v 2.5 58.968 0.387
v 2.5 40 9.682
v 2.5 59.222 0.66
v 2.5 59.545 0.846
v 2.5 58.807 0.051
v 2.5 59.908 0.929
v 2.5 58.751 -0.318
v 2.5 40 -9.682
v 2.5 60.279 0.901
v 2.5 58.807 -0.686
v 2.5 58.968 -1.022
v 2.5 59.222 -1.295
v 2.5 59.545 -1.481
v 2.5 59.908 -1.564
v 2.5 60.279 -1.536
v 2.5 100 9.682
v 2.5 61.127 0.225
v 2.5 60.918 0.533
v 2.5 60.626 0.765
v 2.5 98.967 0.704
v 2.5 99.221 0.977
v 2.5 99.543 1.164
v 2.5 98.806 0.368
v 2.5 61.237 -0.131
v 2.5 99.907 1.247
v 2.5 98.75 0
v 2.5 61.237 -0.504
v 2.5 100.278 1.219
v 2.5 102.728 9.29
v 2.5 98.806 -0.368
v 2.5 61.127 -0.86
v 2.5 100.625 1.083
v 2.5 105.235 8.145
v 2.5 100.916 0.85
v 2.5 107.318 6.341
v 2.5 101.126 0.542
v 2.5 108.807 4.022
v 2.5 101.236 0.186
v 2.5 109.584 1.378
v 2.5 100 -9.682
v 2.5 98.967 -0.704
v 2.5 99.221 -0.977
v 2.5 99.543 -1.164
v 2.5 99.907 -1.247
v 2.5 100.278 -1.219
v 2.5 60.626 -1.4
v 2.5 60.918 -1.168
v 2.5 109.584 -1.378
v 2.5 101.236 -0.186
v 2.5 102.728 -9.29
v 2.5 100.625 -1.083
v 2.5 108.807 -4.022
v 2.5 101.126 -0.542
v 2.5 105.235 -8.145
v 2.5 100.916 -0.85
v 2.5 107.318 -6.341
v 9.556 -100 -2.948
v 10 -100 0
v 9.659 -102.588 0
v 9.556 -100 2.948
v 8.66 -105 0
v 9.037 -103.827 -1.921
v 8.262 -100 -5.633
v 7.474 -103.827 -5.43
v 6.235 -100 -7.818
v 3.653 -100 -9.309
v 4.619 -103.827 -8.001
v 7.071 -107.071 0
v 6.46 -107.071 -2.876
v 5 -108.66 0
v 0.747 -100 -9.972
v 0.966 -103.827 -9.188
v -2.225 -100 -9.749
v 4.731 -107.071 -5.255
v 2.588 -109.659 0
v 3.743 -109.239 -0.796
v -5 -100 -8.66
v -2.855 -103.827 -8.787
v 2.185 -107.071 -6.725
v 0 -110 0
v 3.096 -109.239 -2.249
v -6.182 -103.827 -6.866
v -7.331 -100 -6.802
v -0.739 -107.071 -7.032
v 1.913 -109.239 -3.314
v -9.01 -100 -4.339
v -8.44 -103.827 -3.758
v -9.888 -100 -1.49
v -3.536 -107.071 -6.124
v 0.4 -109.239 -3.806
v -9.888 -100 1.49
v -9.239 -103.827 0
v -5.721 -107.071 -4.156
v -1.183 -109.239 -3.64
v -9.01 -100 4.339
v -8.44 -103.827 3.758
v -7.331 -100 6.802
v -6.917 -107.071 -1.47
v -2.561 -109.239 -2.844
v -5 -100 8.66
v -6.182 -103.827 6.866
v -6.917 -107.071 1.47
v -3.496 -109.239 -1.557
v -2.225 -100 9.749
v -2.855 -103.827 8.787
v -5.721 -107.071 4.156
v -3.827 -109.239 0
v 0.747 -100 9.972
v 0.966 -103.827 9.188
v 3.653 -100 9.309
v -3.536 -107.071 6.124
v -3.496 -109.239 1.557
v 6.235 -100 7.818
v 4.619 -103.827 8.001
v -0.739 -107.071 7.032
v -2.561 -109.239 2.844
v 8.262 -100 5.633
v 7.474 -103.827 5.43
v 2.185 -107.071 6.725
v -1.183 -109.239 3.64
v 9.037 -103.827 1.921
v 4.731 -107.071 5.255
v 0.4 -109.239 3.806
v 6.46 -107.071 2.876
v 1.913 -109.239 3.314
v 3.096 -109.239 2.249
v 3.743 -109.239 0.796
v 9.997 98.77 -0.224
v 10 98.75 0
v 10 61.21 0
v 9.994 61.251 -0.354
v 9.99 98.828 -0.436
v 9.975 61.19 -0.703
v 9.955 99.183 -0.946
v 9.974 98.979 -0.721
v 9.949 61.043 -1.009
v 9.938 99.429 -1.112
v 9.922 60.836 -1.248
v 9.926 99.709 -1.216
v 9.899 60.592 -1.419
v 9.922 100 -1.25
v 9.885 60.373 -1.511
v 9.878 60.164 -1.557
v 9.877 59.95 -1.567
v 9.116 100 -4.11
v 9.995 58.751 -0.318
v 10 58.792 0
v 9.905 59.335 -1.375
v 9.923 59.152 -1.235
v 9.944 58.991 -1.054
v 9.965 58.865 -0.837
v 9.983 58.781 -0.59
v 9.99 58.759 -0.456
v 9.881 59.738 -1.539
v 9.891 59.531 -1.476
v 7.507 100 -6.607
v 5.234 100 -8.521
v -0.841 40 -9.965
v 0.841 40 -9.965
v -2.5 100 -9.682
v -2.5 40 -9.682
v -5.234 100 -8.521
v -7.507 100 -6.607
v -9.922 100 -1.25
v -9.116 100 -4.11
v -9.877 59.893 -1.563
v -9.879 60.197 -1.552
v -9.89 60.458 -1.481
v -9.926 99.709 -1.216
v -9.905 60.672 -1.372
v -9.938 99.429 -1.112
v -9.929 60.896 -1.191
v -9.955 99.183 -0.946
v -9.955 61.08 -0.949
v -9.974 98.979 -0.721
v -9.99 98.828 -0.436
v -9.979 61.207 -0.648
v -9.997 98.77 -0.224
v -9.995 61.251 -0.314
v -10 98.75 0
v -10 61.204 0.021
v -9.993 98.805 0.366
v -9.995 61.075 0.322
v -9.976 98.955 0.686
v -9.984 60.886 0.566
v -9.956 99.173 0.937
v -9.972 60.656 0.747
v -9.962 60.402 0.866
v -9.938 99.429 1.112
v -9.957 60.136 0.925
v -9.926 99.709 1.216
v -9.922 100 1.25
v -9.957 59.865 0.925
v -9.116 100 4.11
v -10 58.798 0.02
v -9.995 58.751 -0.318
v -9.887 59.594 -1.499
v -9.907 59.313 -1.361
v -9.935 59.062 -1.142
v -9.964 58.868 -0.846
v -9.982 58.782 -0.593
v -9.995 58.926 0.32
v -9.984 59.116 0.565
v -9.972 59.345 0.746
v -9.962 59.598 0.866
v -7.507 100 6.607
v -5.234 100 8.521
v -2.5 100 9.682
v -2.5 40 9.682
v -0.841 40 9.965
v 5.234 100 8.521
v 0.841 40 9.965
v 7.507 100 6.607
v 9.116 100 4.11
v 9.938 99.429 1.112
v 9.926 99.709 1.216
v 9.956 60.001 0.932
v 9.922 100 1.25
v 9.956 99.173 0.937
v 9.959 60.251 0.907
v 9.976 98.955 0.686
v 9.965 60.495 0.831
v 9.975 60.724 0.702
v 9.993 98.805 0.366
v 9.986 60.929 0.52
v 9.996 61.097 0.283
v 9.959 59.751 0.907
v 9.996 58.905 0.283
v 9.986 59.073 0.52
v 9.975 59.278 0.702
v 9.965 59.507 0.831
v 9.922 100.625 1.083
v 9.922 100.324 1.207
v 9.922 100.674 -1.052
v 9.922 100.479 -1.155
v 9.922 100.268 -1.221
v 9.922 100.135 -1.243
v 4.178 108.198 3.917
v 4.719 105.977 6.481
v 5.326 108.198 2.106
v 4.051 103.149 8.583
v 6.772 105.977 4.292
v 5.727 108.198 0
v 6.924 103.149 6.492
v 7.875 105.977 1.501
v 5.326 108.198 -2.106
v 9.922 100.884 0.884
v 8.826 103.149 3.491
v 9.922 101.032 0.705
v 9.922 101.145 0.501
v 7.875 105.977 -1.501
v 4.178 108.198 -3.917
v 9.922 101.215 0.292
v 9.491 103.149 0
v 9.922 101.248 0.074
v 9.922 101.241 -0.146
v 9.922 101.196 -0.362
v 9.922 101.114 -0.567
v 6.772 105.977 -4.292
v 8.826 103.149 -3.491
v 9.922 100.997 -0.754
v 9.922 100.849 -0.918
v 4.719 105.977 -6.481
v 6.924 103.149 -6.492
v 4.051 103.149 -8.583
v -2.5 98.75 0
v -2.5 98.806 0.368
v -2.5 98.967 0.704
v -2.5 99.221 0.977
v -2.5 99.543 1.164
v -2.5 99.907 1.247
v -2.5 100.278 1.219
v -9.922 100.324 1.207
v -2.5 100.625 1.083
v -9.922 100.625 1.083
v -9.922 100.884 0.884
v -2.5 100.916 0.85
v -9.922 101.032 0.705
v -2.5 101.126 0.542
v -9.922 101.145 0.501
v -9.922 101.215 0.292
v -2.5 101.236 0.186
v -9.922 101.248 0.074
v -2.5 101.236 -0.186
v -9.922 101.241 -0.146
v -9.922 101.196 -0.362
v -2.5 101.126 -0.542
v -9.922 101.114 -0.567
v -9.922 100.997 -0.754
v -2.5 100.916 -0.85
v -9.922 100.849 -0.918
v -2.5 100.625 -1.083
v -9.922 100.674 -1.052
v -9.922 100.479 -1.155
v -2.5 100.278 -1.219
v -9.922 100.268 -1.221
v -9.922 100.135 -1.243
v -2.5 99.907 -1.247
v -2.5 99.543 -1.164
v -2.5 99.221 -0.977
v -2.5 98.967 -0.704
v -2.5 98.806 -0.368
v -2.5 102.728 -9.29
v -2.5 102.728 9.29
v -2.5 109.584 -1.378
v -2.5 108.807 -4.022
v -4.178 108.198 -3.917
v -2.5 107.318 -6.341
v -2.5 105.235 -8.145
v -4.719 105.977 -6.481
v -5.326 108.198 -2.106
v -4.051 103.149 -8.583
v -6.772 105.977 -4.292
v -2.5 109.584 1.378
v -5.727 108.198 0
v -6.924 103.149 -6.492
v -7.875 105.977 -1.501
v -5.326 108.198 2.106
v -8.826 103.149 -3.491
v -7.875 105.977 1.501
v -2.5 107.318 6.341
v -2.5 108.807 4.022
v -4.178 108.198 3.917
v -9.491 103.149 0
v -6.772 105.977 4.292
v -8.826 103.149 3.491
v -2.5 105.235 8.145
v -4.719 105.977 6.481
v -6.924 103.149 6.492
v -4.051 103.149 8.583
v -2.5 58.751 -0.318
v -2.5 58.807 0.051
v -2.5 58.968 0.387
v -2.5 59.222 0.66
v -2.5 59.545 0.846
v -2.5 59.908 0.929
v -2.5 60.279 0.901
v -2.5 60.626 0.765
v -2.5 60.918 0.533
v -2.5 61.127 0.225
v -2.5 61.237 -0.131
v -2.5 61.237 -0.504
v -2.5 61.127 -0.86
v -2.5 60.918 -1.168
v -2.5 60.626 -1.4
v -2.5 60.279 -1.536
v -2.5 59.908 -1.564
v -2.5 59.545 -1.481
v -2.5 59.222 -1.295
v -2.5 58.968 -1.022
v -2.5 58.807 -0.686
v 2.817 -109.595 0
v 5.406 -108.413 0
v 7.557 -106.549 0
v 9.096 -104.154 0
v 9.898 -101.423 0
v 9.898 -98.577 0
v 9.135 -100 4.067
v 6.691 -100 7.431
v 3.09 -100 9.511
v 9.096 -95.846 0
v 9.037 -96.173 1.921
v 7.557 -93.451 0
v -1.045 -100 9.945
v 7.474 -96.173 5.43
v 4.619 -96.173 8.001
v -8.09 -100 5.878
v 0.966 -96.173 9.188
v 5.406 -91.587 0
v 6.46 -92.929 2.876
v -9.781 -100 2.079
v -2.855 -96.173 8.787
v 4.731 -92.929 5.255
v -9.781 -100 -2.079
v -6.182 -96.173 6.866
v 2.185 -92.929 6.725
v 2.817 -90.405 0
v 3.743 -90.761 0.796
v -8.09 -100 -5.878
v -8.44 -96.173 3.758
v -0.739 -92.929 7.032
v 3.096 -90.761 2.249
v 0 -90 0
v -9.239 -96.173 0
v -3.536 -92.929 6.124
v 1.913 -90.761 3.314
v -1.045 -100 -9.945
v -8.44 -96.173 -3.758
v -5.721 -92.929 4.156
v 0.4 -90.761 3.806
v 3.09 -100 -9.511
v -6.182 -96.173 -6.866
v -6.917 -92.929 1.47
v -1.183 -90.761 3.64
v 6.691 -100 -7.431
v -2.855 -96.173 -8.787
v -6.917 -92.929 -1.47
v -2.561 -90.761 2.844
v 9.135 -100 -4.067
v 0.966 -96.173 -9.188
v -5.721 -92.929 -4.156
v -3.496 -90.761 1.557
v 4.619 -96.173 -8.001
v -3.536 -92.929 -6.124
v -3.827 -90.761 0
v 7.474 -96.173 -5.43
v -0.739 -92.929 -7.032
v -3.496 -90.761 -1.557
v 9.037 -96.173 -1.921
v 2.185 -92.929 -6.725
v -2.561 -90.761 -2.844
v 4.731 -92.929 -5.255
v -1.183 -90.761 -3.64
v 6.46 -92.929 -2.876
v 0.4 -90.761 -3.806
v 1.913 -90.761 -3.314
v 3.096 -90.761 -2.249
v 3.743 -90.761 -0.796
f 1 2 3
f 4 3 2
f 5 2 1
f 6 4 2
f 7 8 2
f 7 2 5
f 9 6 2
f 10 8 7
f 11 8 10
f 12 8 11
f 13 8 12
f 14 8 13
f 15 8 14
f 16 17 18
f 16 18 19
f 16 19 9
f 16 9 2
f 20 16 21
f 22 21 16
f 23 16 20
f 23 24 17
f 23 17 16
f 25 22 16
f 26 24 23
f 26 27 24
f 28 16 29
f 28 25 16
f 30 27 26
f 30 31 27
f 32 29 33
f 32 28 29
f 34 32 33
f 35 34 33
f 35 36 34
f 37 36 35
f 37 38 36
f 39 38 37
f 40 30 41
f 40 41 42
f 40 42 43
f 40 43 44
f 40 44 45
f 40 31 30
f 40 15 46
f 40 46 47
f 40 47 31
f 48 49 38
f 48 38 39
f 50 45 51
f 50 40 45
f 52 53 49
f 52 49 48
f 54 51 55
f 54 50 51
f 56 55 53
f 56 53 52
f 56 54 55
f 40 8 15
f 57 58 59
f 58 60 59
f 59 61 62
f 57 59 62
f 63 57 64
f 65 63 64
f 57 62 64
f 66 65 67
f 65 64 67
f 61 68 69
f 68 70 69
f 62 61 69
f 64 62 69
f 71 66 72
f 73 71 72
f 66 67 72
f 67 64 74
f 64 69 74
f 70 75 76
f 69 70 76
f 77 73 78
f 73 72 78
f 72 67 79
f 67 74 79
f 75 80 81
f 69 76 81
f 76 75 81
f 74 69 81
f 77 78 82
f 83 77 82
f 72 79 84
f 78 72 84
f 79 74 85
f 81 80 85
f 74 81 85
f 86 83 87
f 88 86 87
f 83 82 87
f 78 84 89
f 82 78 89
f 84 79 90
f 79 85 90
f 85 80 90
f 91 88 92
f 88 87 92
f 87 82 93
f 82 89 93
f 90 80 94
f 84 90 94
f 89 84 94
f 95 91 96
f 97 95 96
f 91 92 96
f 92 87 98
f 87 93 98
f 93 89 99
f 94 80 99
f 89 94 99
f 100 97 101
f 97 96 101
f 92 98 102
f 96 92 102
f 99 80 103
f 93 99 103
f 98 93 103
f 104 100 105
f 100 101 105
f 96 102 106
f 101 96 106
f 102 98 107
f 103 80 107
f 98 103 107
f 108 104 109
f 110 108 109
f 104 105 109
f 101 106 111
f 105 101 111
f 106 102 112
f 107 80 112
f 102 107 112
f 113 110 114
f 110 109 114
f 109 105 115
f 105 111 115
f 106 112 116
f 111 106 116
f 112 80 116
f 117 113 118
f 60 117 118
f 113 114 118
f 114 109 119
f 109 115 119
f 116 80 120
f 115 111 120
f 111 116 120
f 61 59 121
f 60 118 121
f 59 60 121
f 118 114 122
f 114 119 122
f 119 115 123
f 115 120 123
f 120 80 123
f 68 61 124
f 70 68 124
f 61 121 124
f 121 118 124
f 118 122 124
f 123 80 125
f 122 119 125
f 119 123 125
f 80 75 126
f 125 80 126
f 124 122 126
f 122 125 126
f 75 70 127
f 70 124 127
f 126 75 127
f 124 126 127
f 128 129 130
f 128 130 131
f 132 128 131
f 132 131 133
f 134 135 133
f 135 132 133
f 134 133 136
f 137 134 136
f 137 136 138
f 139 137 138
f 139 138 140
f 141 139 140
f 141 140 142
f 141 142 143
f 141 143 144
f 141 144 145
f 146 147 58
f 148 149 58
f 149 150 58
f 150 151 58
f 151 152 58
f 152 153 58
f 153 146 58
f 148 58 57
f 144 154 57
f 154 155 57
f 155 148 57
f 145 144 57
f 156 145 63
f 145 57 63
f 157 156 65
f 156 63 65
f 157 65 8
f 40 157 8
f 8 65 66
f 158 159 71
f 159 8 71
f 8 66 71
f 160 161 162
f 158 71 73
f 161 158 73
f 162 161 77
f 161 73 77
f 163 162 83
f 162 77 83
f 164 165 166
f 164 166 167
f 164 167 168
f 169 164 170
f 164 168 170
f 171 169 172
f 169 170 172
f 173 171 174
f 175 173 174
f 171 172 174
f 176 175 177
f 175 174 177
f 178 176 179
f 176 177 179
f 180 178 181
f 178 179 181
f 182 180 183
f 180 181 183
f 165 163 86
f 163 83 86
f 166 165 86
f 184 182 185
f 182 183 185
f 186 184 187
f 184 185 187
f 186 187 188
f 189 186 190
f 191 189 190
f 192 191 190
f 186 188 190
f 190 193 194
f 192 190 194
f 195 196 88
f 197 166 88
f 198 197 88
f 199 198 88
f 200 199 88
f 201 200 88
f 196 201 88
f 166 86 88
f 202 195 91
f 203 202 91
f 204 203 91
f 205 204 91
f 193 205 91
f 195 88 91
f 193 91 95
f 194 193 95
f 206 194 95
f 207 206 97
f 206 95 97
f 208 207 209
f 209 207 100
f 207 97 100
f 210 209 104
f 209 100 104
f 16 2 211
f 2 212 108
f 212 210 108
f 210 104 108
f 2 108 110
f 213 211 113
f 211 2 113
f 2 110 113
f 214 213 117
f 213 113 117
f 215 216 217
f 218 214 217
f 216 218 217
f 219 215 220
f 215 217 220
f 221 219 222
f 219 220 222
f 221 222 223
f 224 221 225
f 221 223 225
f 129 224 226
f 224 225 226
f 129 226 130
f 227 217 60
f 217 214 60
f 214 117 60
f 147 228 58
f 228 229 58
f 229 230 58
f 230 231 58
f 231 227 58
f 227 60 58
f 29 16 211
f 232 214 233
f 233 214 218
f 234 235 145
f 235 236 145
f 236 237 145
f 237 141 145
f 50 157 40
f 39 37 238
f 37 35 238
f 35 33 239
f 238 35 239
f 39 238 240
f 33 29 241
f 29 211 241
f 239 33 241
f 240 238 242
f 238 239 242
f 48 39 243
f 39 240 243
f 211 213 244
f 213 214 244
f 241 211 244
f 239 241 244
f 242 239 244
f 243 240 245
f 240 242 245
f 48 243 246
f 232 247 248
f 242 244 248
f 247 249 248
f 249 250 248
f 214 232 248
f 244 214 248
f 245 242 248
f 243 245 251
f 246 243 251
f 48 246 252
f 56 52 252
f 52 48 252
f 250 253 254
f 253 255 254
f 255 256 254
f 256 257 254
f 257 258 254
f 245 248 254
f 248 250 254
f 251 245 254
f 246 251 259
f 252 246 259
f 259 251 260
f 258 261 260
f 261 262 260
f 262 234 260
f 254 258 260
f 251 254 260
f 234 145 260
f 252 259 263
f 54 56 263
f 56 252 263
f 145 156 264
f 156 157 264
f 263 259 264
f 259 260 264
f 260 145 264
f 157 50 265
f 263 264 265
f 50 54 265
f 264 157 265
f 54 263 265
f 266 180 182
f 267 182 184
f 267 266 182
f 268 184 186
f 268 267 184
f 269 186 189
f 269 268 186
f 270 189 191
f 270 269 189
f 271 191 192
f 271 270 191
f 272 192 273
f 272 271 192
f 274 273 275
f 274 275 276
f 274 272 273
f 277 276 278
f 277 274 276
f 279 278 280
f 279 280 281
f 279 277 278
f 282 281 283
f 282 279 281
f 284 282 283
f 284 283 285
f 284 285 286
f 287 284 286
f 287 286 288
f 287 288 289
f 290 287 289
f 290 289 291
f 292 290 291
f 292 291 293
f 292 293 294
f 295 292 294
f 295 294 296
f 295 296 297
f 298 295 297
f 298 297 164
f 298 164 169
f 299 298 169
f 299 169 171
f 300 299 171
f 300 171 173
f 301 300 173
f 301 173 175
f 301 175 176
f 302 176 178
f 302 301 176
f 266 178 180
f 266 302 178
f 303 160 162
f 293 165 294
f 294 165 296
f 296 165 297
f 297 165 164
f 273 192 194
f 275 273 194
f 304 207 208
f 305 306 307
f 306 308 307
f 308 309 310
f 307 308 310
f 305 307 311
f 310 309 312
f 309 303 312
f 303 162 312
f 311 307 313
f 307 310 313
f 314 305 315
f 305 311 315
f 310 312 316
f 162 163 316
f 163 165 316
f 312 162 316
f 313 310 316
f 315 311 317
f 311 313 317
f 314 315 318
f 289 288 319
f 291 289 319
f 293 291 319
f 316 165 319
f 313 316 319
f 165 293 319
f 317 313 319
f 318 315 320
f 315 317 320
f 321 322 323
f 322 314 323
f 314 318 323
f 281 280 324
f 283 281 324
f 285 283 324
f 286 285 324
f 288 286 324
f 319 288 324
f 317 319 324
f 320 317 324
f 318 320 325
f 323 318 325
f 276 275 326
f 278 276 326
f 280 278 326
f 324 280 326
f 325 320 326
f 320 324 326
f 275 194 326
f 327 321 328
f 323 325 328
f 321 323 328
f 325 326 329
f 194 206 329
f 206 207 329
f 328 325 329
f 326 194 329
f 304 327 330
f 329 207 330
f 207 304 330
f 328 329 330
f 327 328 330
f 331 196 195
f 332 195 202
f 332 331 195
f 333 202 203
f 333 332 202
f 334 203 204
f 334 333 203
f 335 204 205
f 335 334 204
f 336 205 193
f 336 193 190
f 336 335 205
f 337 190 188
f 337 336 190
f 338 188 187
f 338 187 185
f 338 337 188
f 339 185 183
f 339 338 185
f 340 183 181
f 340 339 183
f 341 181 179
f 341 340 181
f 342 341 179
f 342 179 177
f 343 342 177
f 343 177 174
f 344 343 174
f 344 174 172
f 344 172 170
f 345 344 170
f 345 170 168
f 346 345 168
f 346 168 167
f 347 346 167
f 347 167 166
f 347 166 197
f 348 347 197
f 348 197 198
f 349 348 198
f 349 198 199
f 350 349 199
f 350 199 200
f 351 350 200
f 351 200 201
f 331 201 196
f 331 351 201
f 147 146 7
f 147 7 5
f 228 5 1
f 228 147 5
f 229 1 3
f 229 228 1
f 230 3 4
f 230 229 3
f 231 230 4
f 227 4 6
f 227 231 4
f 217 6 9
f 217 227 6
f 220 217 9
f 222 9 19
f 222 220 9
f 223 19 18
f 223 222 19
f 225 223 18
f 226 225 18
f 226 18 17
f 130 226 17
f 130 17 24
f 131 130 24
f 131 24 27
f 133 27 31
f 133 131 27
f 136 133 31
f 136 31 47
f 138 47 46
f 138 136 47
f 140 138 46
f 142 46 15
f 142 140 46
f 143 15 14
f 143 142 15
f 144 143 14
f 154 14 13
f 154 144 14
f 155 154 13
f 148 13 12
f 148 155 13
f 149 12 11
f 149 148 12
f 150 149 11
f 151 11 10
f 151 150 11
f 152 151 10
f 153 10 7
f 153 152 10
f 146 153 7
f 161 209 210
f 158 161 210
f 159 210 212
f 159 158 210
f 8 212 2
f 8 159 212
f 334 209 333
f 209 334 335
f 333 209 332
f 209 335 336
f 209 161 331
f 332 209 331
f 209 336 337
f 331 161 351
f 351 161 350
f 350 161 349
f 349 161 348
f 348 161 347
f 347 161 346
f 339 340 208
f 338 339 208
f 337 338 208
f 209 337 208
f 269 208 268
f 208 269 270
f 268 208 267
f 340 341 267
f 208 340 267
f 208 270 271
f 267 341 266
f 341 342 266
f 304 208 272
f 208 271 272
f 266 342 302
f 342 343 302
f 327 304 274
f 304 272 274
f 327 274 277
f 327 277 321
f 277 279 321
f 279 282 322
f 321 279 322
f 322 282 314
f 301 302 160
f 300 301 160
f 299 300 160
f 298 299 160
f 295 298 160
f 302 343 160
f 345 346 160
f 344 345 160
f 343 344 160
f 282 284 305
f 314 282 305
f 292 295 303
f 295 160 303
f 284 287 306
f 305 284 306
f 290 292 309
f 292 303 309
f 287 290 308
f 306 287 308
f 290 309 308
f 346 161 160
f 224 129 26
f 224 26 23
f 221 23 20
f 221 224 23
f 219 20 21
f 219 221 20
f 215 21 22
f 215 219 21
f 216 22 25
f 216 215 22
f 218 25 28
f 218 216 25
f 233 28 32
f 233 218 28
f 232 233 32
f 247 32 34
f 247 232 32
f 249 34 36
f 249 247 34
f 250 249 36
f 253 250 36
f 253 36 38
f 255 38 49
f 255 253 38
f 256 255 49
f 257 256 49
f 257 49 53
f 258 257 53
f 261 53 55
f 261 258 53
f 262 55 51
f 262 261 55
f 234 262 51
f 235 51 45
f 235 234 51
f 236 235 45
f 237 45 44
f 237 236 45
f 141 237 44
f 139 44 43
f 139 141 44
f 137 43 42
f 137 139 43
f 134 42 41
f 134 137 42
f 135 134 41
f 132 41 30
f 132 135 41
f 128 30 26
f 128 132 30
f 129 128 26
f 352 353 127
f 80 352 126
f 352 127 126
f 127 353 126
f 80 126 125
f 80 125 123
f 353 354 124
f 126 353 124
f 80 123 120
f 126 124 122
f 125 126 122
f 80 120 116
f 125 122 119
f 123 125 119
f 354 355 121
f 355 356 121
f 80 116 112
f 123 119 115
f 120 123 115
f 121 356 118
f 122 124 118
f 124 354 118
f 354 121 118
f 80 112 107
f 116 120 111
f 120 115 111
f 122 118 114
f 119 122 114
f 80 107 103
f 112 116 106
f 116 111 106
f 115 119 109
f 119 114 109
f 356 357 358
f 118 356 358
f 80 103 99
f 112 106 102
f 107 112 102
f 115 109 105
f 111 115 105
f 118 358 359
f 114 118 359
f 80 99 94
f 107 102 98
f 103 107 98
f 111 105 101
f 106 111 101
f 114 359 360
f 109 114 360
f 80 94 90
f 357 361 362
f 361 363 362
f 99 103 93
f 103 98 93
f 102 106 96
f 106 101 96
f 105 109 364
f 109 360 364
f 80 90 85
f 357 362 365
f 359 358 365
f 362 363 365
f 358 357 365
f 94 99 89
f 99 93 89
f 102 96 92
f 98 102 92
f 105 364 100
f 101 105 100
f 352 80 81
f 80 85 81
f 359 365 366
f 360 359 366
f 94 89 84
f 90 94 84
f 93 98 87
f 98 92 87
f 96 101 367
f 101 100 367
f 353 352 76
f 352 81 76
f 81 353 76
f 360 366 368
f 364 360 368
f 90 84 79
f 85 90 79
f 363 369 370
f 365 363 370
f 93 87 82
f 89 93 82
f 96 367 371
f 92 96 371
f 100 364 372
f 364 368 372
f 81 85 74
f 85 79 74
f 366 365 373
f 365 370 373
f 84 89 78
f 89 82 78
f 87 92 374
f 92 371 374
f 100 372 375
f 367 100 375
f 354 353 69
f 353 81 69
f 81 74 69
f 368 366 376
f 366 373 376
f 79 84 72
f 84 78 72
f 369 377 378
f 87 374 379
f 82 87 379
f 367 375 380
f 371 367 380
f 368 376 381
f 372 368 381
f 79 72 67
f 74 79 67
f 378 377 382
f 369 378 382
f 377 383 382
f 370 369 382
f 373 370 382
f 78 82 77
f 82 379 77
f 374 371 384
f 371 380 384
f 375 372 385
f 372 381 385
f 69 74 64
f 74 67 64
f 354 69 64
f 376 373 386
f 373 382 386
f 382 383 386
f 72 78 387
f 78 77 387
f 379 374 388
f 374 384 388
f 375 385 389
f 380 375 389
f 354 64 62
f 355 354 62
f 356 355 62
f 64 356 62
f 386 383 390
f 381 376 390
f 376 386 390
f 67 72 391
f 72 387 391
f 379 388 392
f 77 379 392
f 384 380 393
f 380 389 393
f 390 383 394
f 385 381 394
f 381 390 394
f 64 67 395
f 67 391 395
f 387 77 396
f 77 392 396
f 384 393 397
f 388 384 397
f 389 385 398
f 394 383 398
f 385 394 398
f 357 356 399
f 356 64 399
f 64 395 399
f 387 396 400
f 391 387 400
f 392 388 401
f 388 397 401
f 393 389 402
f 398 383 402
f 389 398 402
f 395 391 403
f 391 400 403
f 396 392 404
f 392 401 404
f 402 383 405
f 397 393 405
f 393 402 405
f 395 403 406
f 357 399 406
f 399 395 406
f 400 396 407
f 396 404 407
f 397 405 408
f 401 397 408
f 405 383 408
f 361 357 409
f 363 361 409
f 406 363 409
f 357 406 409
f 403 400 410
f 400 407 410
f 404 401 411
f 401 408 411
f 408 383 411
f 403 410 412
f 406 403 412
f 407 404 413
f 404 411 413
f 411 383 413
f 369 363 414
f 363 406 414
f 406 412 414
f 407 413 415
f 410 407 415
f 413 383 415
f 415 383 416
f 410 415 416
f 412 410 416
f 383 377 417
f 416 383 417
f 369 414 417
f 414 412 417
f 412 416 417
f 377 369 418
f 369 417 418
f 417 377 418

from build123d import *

# Parameters (mm, degrees)
CUT_EXTRUDE2_DEPTH      = 111.905365064
CUT_EXTRUDE2_DEPTH_BACK = 111.905365064
SKETCH3_W               = 5
SKETCH3_H               = 70
CUT_EXTRUDE3_DEPTH      = 112.158670377
CUT_EXTRUDE3_DEPTH_BACK = 112.158670377
SKETCH4_R               = 1.25


with BuildPart() as part:
    # Sketch1 → Revolve2 (revolve)
    with BuildSketch(Plane.XY):
        with BuildLine():
            Line((0, 100), (0, 110))
            ThreePointArc((0, 110), (7.071067812, 107.071067812), (10, 100))
            Line((10, 100), (10, -100))
            ThreePointArc((10, -100), (7.071067812, -107.071067812), (0, -110))
            Line((0, -110), (0, -100))
            Line((0, -100), (0, 100))
        make_face()
    revolve(axis=Axis((0, 100, 0), (0, 1, 0)))

    # Sketch3 → Cut-Extrude2 (cut, two sides: drawn at the far end of the back side and taken through both)
    with BuildSketch(Plane.XY.offset(-CUT_EXTRUDE2_DEPTH_BACK)):
        with Locations((0, 75)):
            Rectangle(SKETCH3_W, SKETCH3_H)
    extrude(amount=CUT_EXTRUDE2_DEPTH + CUT_EXTRUDE2_DEPTH_BACK, mode=Mode.SUBTRACT)

    # Sketch4 → Cut-Extrude3 (cut, two sides: drawn at the far end of the back side and taken through both)
    with BuildSketch(Plane.ZY.offset(-2.5).offset(-CUT_EXTRUDE3_DEPTH_BACK)):
        with Locations((0, 100)):
            Circle(SKETCH4_R)
        with Locations((-0.317541634, 60.001260428)):
            Circle(SKETCH4_R)
    extrude(amount=CUT_EXTRUDE3_DEPTH + CUT_EXTRUDE3_DEPTH_BACK, mode=Mode.SUBTRACT)


with BuildPart() as body_2:
    # Sketch6 → Revolve4 (revolve)
    with BuildSketch(Plane.XY):
        with BuildLine():
            Line((0, -90), (0, -110))
            ThreePointArc((0, -110), (10, -100), (0, -90))
        make_face()
    revolve(axis=Axis((0, -90, 0), (0, -1, 0)))


solid = Compound([part.part, body_2.part])
